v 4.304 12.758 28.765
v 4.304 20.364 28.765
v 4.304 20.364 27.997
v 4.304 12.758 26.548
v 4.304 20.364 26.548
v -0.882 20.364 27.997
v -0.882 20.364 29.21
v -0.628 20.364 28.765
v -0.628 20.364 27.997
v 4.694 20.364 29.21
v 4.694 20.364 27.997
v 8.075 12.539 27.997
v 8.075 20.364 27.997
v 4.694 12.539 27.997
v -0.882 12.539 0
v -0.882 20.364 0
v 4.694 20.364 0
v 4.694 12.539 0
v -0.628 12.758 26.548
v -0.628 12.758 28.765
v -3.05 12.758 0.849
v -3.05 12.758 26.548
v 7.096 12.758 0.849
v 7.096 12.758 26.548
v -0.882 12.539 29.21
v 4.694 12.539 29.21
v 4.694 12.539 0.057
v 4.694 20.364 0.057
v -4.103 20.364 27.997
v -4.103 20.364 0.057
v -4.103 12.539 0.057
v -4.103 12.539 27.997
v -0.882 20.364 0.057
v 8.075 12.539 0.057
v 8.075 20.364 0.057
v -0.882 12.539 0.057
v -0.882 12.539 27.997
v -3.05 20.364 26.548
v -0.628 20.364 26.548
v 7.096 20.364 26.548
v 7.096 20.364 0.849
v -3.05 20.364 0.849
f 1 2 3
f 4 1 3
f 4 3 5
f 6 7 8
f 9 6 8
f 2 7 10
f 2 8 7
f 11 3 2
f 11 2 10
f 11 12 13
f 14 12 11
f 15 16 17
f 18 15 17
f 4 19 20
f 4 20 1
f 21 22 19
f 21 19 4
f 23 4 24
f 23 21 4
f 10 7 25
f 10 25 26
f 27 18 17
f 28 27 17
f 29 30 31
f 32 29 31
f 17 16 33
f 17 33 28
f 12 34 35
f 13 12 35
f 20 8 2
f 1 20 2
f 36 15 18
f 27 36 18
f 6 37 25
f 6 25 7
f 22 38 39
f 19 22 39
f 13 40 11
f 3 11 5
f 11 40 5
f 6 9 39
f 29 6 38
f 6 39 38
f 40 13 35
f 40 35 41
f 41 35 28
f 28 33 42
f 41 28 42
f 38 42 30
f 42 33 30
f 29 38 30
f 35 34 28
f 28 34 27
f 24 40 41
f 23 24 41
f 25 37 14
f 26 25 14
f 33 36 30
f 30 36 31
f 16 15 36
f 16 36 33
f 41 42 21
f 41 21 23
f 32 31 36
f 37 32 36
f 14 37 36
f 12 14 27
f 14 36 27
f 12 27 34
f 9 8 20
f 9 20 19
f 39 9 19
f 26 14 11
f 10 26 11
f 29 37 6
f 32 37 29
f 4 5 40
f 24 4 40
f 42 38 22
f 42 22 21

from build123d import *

# Parameters (mm, degrees)
BOSS_EXTRUDE1_DEPTH = 27.94
SKETCH2_W           = 5.576427518
SKETCH2_H           = 7.825401813
BOSS_EXTRUDE4_DEPTH = 29.21
SKETCH8_W           = 10.146325875
SKETCH8_H           = 25.699088163
CUT_EXTRUDE2_DEPTH  = 7.606325874
SKETCH10_W          = 4.931914879
SKETCH10_H          = 2.216881434
CUT_EXTRUDE3_DEPTH  = 7.606325874


with BuildPart() as part:
    # 3DSketch1 → Boss-Extrude1 (new body)
    with BuildSketch(Plane(origin=(-4.102739017, 20.36405405, 0.057228779), x_dir=(0.8412817346270438, -0.540596932087958, 0), z_dir=(0, 0, -1))):
        Polygon((0, 0), (4.230388213, 6.583367612), (14.475483209, 0), (10.245094996, -6.583367612), align=None)
    extrude(amount=-BOSS_EXTRUDE1_DEPTH)

    # Sketch2 → Boss-Extrude4 (add)
    with BuildSketch(Plane.XY):
        with Locations((1.905853526, 16.451353144)):
            Rectangle(SKETCH2_W, SKETCH2_H)
    extrude(amount=BOSS_EXTRUDE4_DEPTH)

    # Sketch8 → Cut-Extrude2 (cut)
    with BuildSketch(Plane(origin=(0, 20.36405405, 0), x_dir=(1, 0, 0), z_dir=(0, 1, 0))):
        with Locations((2.022741779, -13.698787424)):
            Rectangle(SKETCH8_W, SKETCH8_H)
    extrude(amount=-CUT_EXTRUDE2_DEPTH, mode=Mode.SUBTRACT)

    # Sketch10 → Cut-Extrude3 (cut)
    with BuildSketch(Plane(origin=(0, 20.36405405, 0), x_dir=(1, 0, 0), z_dir=(0, 1, 0))):
        with Locations((1.837563479, -27.656772222)):
            Rectangle(SKETCH10_W, SKETCH10_H)
    extrude(amount=-CUT_EXTRUDE3_DEPTH, mode=Mode.SUBTRACT)


solid = part.part
